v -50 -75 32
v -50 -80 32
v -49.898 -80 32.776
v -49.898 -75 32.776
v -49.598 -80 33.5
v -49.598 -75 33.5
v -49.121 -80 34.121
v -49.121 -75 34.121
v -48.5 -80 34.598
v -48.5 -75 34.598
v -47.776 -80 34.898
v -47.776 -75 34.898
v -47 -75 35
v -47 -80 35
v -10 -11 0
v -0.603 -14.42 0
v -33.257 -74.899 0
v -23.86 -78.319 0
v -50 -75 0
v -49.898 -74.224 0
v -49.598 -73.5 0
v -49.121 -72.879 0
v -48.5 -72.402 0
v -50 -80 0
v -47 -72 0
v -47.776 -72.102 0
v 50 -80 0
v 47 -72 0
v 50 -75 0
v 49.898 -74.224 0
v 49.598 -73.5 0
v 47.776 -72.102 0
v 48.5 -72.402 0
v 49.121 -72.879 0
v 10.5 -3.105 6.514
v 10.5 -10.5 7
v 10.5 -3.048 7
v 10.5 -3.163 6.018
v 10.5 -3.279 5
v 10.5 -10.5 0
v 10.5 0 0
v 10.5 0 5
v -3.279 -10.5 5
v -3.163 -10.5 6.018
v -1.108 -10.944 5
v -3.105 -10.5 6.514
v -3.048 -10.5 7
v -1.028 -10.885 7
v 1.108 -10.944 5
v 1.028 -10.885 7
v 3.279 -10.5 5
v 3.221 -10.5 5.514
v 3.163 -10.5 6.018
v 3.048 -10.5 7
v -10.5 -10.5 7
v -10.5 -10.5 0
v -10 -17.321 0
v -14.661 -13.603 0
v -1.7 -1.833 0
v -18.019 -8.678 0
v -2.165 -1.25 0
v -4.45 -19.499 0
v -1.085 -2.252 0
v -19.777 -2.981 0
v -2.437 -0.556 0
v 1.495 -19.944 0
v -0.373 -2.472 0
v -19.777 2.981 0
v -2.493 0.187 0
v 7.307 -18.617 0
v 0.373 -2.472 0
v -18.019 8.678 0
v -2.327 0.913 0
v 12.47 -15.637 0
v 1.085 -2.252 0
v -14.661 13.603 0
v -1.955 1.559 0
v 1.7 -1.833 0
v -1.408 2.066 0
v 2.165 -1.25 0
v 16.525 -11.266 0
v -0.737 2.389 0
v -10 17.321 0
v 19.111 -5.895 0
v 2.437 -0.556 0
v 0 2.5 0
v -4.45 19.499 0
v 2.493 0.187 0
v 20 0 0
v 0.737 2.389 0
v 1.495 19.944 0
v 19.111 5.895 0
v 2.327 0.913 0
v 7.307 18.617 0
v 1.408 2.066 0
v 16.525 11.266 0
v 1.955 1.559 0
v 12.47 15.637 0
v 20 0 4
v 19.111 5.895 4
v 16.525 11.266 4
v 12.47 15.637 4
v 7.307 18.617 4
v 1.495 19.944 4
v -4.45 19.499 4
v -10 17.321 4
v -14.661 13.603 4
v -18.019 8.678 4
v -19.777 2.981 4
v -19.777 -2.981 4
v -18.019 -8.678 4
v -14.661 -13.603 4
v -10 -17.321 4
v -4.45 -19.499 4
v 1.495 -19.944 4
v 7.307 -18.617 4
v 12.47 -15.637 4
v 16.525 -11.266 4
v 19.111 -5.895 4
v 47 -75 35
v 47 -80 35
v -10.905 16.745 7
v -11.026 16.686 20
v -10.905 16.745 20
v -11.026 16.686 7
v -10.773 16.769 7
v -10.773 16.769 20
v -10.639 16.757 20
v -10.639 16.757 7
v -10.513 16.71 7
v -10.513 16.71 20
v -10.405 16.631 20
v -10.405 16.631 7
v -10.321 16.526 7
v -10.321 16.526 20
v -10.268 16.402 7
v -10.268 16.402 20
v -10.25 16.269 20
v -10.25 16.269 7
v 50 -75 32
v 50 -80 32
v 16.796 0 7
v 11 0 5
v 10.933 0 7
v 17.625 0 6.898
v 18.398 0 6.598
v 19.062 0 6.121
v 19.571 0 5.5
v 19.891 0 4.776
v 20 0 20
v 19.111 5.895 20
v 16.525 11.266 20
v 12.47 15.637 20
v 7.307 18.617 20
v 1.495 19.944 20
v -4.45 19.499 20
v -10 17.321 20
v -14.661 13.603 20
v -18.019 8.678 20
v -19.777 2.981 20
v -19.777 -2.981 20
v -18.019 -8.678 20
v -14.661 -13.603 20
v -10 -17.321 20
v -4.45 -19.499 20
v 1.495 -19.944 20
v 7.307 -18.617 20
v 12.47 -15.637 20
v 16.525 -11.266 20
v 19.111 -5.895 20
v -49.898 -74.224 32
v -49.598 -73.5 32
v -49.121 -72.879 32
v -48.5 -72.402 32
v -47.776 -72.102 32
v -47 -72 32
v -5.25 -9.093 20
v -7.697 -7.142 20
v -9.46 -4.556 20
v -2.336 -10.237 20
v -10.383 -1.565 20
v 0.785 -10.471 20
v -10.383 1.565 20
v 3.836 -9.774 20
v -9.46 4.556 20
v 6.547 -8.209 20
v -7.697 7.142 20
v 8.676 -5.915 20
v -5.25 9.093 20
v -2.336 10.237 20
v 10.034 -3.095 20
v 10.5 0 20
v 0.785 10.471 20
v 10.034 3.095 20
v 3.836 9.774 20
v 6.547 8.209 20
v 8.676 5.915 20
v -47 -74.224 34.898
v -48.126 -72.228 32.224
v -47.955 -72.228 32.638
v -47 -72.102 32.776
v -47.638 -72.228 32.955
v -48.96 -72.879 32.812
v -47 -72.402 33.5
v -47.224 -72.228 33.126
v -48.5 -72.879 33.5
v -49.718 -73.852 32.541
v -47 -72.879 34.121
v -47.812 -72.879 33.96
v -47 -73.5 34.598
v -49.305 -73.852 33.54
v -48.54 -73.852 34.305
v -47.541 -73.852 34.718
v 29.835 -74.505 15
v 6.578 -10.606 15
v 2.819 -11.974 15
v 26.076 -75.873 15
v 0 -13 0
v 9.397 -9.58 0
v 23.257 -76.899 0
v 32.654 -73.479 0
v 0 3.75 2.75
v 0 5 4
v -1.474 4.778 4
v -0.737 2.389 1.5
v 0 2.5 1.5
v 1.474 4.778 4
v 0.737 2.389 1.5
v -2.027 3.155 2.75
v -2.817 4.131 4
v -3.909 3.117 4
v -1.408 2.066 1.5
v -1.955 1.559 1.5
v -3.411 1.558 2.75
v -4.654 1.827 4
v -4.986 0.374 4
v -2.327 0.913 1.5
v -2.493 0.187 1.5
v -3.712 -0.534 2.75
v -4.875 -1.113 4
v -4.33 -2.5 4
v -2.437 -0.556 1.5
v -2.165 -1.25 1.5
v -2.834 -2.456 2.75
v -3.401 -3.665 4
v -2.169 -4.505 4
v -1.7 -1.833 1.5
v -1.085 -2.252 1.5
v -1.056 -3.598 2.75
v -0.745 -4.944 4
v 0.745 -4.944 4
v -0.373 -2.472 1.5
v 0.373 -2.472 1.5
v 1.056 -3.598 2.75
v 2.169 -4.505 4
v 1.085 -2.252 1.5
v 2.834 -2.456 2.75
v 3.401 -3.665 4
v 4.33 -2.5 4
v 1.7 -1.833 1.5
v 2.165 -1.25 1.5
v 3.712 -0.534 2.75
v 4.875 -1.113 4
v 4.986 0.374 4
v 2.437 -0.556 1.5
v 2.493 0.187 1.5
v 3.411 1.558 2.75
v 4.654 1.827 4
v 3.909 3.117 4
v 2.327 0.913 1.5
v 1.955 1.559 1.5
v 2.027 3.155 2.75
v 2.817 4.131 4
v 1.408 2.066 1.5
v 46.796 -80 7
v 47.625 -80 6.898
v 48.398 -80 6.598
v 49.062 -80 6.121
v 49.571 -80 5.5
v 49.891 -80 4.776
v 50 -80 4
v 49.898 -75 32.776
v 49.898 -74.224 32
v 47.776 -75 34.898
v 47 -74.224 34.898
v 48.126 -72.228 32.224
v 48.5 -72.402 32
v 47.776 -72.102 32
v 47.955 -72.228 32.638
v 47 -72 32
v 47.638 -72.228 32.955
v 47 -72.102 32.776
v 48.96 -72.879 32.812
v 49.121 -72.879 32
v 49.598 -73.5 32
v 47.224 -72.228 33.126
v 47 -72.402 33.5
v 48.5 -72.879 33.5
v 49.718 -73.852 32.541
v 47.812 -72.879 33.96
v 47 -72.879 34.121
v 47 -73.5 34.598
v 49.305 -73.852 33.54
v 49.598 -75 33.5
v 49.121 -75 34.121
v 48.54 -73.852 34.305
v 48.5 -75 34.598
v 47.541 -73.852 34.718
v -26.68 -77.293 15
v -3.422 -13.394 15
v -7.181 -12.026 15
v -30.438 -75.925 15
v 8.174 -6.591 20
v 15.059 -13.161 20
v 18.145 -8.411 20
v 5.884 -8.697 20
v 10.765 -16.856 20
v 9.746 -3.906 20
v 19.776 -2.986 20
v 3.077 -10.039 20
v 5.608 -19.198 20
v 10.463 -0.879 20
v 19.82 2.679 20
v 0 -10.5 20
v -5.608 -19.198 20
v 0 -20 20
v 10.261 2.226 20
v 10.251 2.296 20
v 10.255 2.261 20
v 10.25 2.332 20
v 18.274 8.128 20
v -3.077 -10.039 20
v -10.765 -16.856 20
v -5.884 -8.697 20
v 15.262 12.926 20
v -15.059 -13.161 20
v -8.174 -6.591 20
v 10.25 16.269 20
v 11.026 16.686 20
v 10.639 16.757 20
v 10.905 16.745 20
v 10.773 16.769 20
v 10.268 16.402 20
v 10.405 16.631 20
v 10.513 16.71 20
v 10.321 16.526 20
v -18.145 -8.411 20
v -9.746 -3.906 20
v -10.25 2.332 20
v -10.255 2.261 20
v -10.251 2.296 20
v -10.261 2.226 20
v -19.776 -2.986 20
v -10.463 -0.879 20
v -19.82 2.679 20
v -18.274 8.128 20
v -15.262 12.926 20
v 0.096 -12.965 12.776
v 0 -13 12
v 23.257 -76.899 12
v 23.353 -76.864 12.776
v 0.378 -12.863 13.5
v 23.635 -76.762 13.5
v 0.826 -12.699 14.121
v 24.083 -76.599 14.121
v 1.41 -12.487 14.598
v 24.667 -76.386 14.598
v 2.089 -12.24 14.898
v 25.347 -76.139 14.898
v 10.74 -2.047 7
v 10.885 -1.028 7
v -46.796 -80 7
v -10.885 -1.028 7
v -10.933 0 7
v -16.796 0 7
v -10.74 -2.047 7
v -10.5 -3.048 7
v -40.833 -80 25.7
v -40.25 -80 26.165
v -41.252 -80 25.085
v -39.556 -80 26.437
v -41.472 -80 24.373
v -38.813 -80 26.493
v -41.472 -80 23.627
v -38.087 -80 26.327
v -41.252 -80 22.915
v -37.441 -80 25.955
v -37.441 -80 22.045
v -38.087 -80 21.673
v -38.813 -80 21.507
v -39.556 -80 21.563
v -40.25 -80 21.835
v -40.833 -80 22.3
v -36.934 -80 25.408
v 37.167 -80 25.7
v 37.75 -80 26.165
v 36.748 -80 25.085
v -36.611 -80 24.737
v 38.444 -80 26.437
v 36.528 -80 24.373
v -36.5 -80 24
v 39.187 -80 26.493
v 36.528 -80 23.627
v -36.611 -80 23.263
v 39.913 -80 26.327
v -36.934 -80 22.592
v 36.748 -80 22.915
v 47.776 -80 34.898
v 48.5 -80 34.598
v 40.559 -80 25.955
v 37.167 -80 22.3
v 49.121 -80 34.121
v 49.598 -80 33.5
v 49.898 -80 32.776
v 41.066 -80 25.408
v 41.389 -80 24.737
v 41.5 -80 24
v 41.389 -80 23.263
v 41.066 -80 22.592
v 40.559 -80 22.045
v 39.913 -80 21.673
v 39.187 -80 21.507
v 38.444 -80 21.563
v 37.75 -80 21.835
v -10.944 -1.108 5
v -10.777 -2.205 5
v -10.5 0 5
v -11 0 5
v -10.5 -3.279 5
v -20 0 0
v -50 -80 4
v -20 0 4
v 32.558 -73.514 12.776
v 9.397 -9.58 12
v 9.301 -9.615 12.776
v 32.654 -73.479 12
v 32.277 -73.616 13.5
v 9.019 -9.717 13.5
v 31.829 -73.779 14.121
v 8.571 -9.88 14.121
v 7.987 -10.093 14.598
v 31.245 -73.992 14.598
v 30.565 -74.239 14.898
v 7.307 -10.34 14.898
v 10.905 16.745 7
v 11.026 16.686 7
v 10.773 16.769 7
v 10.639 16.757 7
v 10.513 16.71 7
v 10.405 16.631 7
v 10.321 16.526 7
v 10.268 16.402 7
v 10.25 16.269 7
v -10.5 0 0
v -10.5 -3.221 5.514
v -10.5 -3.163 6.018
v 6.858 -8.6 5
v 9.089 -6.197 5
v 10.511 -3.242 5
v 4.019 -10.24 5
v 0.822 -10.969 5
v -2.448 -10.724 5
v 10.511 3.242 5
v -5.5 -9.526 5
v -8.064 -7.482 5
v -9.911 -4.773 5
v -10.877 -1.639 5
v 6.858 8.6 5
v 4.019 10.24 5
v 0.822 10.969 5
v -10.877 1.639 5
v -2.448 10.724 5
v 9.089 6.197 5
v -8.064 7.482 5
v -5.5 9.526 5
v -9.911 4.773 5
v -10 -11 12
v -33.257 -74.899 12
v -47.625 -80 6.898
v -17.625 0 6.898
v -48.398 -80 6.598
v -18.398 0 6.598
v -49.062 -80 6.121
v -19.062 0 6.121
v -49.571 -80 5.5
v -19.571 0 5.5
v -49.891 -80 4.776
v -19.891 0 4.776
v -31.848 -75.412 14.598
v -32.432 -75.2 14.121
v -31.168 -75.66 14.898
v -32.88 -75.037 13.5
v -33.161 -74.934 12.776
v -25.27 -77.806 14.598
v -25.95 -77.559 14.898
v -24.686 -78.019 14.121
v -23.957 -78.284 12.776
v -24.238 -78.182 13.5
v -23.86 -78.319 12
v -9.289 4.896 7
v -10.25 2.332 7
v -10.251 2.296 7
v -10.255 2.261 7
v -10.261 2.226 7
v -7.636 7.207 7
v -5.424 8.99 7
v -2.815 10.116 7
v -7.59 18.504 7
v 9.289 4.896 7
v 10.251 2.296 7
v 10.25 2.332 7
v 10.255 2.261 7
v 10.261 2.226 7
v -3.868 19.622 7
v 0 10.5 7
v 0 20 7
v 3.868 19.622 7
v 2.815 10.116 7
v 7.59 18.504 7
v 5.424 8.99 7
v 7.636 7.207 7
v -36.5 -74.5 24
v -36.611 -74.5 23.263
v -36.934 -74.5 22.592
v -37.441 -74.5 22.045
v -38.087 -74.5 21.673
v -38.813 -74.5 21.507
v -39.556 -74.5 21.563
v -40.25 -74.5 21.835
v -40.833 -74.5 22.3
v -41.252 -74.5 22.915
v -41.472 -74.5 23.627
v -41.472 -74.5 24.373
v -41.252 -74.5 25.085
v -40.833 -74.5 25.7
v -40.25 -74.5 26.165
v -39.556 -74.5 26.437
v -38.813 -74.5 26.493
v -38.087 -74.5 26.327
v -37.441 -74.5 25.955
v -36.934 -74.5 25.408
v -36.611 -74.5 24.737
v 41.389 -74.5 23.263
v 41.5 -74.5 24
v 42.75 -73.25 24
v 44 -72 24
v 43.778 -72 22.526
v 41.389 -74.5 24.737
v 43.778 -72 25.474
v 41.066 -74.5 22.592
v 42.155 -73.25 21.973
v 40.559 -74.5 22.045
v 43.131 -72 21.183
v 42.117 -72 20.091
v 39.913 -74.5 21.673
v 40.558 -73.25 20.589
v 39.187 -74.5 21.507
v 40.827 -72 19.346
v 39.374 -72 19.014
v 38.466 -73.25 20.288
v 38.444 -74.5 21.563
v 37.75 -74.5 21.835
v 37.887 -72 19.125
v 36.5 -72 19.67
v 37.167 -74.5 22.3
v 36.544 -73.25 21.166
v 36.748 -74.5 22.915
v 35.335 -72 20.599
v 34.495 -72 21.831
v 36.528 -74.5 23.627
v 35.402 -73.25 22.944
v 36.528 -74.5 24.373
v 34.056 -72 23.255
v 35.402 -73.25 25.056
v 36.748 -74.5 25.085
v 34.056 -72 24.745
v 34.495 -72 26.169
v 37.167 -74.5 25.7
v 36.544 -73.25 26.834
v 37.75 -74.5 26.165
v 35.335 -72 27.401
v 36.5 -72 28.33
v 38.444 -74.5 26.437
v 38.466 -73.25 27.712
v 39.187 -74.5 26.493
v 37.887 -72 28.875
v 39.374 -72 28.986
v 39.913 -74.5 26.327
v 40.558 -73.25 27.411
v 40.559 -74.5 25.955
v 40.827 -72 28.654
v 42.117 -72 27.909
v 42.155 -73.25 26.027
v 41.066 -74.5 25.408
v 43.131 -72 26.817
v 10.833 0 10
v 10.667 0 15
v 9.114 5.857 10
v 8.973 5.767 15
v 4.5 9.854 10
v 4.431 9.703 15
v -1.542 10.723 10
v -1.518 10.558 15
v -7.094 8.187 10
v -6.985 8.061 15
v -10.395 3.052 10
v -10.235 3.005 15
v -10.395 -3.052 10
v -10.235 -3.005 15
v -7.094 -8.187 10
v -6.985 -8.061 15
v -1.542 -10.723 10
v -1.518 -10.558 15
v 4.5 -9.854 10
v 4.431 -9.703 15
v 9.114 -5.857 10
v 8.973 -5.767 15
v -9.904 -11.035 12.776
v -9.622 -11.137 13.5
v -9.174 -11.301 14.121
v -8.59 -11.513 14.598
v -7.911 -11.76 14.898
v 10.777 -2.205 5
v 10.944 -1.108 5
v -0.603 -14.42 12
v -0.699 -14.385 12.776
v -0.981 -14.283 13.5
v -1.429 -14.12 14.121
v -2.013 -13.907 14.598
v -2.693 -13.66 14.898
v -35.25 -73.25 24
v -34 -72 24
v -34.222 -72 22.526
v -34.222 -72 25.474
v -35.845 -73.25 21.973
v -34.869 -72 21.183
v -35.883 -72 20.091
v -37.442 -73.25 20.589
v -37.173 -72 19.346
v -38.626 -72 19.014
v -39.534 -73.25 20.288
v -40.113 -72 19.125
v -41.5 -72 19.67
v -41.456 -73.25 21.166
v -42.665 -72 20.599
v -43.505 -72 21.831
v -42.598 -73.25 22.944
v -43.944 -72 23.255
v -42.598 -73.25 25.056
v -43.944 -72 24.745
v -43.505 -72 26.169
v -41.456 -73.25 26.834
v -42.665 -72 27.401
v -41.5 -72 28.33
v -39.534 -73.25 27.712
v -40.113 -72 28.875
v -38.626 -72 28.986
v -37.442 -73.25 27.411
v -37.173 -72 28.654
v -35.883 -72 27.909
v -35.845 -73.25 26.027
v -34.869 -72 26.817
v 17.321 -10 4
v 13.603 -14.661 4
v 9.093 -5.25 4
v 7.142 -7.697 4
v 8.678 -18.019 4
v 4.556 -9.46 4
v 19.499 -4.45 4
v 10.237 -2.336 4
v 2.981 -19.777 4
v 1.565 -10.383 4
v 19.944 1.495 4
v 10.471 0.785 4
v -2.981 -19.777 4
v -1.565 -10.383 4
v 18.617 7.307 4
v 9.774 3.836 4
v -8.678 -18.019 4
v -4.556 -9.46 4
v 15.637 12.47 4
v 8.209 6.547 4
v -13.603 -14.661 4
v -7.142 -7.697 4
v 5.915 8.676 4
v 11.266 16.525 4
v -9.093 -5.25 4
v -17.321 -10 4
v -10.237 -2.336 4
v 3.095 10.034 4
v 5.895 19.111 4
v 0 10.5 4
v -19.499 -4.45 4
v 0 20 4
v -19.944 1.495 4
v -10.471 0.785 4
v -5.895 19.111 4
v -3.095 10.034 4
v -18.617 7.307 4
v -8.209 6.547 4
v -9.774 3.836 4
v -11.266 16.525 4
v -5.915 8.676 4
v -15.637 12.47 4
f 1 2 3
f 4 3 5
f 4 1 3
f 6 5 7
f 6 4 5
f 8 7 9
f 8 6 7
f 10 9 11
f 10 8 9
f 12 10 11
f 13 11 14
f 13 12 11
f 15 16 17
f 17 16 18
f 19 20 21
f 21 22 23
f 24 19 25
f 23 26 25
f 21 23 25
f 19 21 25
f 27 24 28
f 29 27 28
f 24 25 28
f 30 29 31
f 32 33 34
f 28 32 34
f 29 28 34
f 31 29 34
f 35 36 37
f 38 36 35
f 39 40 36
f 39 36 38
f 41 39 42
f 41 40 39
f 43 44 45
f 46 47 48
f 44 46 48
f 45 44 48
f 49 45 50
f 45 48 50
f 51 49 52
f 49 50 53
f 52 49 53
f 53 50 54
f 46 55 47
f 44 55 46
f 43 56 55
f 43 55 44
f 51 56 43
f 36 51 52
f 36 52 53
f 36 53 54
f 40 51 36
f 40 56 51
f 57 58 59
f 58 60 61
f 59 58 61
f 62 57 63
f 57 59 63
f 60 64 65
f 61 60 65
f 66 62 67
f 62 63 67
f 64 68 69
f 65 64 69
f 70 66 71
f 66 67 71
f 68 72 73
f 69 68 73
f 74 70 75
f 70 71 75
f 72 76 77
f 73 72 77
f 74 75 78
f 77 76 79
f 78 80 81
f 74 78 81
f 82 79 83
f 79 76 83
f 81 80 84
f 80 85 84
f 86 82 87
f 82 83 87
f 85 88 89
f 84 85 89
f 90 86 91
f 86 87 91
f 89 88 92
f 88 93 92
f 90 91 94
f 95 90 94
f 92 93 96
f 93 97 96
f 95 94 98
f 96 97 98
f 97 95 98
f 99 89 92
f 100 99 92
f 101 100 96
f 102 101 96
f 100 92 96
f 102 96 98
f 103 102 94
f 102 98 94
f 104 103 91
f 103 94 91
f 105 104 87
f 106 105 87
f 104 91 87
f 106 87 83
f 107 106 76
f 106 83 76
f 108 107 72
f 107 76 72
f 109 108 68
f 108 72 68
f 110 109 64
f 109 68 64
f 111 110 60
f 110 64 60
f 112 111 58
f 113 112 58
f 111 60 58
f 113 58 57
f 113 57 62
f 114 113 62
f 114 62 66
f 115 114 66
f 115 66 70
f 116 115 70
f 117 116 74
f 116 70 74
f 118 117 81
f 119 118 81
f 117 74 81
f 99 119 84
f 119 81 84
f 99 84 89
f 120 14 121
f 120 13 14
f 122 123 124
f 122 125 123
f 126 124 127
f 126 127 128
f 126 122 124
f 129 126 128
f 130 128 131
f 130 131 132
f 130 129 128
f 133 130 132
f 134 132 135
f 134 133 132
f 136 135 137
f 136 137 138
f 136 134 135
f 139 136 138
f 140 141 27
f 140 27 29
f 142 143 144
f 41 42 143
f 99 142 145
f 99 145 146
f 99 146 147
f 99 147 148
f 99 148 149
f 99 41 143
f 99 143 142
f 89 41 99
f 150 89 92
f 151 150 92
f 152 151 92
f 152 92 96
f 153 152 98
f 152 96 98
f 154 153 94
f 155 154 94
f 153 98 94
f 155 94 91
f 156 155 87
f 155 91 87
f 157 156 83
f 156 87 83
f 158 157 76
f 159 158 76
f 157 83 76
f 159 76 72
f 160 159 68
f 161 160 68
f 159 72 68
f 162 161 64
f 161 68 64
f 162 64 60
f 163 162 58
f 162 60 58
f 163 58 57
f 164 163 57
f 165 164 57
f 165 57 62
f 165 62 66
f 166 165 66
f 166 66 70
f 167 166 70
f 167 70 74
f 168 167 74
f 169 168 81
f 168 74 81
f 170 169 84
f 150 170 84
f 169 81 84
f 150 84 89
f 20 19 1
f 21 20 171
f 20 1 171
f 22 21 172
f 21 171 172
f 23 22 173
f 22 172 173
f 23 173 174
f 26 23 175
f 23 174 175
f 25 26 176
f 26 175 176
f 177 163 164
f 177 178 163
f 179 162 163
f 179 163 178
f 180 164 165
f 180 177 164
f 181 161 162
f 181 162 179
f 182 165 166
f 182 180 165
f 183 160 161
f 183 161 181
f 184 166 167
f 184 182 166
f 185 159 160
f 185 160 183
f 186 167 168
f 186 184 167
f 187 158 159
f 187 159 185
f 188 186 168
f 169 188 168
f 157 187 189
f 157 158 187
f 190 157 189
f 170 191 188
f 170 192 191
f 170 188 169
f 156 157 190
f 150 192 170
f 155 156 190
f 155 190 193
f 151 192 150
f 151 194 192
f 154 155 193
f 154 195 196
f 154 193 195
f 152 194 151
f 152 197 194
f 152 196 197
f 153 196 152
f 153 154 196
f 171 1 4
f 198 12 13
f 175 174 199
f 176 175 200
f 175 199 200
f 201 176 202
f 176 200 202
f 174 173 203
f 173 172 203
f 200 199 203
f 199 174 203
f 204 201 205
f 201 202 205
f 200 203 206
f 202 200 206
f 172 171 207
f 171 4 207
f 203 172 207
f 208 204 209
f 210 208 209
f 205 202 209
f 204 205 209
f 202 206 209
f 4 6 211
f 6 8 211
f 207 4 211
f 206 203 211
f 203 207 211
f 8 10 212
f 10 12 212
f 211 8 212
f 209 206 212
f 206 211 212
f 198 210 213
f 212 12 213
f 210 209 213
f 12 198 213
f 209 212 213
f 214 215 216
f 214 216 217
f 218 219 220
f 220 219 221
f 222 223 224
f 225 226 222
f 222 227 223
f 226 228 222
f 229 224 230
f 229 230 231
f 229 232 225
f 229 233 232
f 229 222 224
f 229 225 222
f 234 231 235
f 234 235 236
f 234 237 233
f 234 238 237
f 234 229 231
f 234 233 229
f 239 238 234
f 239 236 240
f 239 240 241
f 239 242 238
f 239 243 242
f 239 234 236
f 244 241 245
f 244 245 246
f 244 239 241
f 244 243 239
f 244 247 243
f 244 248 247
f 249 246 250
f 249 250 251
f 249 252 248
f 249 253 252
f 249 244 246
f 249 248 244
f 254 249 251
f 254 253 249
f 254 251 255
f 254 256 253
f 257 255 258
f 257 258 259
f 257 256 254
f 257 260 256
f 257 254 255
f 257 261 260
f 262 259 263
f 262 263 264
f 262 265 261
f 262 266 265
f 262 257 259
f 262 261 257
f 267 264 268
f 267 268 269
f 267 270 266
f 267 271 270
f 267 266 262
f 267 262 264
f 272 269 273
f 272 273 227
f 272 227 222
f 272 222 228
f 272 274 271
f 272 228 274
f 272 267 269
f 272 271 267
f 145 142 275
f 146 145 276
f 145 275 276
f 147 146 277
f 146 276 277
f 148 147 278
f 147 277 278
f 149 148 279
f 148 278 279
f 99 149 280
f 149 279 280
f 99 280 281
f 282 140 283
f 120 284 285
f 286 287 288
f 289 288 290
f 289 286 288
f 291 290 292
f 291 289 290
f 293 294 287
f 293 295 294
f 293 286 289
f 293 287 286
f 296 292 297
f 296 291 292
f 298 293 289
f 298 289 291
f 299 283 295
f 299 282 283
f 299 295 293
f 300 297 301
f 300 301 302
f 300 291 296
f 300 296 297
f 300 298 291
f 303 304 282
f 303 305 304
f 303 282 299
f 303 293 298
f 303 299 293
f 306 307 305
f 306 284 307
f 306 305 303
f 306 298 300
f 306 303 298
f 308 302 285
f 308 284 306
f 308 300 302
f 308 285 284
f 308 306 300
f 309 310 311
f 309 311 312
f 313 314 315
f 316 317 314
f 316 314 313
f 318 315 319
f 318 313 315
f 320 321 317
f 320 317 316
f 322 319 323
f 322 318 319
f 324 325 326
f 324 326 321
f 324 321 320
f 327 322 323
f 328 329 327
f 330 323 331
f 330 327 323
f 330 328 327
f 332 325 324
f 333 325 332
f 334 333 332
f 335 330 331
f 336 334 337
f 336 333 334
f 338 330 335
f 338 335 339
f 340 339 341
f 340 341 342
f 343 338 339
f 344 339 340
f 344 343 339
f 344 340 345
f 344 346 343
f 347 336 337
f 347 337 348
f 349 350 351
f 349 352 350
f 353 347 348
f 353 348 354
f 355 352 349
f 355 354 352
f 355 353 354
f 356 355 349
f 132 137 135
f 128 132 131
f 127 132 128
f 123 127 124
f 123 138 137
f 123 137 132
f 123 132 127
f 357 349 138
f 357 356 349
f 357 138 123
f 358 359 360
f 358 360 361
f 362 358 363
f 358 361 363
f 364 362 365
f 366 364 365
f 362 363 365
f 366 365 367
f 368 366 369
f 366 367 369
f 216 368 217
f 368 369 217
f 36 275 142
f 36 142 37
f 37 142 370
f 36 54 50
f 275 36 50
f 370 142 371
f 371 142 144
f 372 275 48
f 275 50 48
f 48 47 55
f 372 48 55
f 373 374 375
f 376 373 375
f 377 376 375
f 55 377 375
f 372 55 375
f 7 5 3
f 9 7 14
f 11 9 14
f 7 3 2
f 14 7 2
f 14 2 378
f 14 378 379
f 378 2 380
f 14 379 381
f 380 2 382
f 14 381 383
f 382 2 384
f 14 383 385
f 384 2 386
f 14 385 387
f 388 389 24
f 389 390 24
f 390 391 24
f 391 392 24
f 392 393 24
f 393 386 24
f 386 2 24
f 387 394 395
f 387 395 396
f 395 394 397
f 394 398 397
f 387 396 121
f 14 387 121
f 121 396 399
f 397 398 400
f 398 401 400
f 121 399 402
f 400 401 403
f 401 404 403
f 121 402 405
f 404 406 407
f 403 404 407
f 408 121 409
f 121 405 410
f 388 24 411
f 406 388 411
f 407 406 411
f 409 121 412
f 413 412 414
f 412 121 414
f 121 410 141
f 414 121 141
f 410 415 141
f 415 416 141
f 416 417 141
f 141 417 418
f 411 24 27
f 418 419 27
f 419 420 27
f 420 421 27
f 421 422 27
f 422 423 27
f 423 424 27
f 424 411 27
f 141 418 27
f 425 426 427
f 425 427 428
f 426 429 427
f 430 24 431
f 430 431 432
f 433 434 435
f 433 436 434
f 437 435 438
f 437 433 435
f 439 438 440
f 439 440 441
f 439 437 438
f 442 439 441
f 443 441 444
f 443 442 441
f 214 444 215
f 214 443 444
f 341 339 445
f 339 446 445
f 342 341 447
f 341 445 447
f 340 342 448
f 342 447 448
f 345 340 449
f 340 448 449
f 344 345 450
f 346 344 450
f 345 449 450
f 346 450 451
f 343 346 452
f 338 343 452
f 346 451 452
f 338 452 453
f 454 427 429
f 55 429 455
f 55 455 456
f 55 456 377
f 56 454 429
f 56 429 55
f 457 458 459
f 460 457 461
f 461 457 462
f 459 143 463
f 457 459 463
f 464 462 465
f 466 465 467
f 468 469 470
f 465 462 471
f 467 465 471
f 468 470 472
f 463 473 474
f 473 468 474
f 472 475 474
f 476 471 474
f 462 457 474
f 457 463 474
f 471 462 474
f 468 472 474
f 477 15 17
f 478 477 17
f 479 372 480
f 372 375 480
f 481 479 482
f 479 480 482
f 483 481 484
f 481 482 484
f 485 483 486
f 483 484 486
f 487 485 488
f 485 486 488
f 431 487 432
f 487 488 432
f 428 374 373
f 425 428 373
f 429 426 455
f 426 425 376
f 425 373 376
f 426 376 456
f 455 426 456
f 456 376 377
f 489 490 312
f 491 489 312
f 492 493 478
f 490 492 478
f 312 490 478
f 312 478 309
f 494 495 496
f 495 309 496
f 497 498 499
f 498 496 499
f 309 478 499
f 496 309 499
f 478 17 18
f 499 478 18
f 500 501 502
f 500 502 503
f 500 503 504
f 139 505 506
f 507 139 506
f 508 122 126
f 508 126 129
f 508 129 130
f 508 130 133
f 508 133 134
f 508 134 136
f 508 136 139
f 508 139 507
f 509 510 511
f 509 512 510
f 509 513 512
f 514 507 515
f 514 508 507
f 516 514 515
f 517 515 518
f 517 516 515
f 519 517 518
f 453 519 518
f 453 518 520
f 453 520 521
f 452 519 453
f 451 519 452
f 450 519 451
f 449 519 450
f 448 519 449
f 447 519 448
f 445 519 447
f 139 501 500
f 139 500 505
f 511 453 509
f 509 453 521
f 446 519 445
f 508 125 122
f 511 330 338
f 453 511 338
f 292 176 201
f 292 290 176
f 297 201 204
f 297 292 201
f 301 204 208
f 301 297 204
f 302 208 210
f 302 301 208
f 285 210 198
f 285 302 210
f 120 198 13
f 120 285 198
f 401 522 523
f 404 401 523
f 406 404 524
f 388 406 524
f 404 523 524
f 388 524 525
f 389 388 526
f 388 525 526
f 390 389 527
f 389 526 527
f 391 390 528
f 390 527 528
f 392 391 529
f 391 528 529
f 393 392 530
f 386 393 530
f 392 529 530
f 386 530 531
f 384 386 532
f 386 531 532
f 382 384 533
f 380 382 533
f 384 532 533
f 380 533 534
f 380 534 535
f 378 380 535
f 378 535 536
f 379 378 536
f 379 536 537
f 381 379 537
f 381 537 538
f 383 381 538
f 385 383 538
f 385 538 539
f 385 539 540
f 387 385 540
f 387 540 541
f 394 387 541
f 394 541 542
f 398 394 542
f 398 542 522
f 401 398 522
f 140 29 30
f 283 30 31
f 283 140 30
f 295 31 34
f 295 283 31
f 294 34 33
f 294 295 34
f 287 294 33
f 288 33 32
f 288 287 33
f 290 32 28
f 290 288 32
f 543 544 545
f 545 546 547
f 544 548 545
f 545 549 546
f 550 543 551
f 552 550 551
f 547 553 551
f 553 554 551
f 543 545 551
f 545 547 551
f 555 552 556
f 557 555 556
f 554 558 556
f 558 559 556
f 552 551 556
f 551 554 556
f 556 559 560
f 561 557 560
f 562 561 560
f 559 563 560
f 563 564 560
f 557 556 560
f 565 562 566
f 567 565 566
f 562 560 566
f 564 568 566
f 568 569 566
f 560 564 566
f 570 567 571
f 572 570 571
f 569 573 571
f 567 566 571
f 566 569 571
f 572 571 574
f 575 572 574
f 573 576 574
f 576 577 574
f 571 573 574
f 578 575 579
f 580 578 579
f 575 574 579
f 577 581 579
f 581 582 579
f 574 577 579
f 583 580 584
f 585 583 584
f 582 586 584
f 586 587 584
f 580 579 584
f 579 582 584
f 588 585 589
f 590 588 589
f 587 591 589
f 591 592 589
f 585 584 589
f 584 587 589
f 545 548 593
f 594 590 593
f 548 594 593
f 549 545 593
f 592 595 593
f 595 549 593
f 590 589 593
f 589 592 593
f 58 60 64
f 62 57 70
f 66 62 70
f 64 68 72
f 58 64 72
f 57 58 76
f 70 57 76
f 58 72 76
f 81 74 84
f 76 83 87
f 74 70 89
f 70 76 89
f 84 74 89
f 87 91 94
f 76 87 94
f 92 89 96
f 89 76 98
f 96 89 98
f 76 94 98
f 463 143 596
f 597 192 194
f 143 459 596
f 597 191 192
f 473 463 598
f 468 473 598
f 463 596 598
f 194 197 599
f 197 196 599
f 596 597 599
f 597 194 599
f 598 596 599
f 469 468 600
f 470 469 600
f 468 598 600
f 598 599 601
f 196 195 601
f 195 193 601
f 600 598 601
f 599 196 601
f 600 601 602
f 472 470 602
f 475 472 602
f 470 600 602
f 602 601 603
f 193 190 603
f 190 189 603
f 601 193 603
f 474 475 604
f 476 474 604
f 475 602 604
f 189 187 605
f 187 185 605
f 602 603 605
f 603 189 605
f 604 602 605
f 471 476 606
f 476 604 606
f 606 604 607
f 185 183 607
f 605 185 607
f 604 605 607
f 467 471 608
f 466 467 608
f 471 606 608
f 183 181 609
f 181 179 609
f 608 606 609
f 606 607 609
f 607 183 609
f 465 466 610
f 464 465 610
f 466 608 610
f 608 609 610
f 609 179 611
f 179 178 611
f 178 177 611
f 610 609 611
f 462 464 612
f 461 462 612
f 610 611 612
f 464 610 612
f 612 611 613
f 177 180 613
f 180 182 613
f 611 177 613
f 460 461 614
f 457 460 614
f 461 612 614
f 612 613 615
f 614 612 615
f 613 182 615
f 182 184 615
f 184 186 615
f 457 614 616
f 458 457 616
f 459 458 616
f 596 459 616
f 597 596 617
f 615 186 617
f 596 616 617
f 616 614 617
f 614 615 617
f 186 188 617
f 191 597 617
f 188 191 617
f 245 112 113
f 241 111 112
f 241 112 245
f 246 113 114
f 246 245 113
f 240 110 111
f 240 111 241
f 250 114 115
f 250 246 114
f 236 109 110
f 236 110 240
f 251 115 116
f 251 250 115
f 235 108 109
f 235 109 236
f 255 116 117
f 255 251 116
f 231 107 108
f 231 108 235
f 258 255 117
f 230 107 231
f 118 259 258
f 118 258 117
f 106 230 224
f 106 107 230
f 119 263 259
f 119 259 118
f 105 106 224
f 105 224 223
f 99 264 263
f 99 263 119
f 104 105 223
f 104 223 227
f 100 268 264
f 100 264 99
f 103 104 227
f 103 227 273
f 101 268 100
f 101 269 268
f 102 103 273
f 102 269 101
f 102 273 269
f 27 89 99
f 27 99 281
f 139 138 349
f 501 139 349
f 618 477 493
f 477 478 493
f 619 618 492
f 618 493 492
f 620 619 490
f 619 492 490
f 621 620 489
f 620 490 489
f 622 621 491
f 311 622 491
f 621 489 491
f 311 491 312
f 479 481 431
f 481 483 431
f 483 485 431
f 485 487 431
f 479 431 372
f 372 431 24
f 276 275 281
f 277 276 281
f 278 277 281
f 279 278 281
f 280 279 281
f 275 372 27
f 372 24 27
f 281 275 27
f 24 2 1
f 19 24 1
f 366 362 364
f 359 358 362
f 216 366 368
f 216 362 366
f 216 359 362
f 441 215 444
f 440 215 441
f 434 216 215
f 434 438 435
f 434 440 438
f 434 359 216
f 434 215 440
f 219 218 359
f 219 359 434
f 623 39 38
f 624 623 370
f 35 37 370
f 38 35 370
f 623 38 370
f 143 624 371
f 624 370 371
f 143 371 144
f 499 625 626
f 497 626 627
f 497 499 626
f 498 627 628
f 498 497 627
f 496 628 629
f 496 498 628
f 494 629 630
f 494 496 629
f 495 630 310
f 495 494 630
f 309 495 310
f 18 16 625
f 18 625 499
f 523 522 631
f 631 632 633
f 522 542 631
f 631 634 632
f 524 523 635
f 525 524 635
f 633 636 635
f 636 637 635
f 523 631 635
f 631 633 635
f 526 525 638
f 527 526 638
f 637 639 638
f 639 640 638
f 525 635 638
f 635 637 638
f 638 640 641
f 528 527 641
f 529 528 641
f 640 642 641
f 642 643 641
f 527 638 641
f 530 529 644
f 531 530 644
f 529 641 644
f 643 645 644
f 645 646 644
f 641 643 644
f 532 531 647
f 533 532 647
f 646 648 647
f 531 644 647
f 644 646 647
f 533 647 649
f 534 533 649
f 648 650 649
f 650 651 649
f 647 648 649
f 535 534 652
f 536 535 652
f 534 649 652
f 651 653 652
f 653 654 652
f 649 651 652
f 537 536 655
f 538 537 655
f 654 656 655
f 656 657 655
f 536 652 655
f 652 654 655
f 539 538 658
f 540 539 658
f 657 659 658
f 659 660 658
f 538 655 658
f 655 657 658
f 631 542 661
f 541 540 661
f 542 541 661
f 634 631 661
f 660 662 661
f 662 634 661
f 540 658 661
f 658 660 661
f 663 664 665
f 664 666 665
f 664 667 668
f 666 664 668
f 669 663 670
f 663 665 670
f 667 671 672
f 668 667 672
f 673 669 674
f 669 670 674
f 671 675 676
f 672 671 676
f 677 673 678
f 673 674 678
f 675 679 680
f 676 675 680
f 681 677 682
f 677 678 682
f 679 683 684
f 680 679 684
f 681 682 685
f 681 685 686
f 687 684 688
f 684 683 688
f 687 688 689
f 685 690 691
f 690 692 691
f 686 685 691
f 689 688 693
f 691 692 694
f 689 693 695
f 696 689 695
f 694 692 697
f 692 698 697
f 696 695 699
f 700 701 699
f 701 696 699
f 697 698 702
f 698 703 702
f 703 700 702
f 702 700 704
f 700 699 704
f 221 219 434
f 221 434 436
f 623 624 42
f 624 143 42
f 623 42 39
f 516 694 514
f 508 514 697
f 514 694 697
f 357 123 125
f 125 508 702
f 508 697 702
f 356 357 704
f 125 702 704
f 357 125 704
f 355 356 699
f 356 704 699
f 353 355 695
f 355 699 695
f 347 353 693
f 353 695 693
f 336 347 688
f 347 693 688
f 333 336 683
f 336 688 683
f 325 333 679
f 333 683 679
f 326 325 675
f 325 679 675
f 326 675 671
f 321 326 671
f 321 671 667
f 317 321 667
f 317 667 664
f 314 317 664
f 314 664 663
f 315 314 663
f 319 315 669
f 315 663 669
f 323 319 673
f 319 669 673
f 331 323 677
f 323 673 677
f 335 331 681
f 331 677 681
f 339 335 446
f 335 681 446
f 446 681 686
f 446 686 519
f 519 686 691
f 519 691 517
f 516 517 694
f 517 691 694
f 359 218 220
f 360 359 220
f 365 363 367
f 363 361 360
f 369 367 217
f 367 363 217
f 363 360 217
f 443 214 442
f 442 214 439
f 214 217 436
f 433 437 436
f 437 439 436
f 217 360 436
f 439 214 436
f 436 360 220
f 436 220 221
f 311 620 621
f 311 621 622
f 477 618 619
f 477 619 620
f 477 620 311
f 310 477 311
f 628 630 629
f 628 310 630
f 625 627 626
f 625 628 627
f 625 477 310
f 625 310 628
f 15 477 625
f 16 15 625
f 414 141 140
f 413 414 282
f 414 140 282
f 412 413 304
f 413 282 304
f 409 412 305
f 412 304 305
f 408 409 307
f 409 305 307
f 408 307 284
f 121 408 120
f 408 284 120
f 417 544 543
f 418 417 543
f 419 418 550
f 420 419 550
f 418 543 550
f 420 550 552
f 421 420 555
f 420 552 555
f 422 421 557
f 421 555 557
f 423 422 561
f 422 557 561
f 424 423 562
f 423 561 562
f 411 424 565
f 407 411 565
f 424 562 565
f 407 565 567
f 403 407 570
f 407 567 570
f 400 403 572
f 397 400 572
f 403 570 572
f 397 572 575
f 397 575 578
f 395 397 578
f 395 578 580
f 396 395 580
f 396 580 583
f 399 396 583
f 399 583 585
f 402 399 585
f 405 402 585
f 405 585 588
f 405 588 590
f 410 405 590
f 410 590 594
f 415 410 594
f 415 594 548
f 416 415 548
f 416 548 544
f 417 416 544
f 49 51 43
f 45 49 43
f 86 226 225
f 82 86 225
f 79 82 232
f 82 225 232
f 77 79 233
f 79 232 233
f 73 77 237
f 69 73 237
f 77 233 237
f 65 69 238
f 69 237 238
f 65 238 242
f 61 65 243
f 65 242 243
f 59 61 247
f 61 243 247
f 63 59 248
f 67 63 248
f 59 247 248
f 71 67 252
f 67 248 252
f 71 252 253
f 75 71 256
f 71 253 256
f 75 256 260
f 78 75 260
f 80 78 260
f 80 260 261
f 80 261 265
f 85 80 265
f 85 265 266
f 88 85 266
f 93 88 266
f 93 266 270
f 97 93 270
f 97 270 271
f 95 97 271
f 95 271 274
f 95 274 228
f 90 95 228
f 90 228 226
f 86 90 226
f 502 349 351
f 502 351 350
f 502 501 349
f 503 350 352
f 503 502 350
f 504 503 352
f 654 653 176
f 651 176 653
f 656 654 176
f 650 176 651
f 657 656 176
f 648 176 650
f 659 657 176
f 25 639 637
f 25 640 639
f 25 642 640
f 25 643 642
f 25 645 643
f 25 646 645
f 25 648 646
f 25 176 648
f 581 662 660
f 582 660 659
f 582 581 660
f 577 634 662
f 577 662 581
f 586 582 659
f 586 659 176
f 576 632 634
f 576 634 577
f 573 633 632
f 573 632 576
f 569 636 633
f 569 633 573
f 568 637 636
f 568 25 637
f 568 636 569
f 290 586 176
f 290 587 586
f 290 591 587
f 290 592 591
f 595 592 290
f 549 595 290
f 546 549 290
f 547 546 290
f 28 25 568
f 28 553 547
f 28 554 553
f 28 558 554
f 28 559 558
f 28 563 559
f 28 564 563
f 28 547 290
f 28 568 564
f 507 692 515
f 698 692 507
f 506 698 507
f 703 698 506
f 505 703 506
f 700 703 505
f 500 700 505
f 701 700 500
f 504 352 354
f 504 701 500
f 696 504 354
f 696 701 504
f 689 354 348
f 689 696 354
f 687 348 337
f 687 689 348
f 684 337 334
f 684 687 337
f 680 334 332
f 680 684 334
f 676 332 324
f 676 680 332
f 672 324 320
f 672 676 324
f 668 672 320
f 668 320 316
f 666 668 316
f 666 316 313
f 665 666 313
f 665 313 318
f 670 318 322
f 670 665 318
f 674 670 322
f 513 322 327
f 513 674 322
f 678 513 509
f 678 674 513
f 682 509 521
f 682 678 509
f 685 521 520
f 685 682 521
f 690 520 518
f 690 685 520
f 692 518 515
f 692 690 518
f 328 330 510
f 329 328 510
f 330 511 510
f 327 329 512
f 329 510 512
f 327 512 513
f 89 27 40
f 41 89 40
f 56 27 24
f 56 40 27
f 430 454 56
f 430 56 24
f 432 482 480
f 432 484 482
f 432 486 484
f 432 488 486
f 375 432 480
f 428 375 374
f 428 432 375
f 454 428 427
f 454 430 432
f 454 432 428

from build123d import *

# Parameters (mm, degrees)
FACE003_R              = 2.5
EXTRUDE003_DEPTH       = 10
SKETCH_R               = 20
EXTRUDE_DEPTH          = 4
CHAMFER_SIZE           = 2.5
EXTRUDE002_DEPTH       = 13
FACE001_R              = 20
FACE001_R_2            = 10.5
EXTRUDE001_DEPTH       = 16
FILLET_R               = 0.5
CYLINDER_R             = 20
CYLINDER_DEPTH         = 20
EXTRUDE004_DEPTH       = 7
FILLET001_R            = 3
BOX001_W               = 68
BOX001_H               = 10
BOX001_DEPTH           = 15
BOX001_PLACEMENT_ANGLE = 110
FILLET003_R            = 3
BOX002_W               = 68
BOX002_H               = 10
BOX002_DEPTH           = 15
BOX002_PLACEMENT_ANGLE = 70
FILLET004_R            = 3
FACE005_R              = 2.5
EXTRUDE005_DEPTH       = 10
BOX_W                  = 100
BOX_H                  = 8
BOX_DEPTH              = 35
FILLET002_R            = 3
CHAMFER001_SIZE        = 2.5


with BuildPart() as extrude003:
    # Face003 → Extrude003 (new body)
    with BuildSketch(Plane(origin=(0, 0, 4), x_dir=(0, 1, 0), z_dir=(0, 0, 1))):
        Circle(FACE003_R)
    extrude(amount=-EXTRUDE003_DEPTH)


with BuildPart() as chamfer_body:
    # Sketch → Extrude (new body)
    with BuildSketch(Plane.XY):
        Circle(SKETCH_R)
    extrude(amount=EXTRUDE_DEPTH)

    # Cut001: cut Extrude003
    add(extrude003.part, mode=Mode.SUBTRACT)

    # Chamfer
    chamfer_edges = [chamfer_body.edges().sort_by_distance(p)[0] for p in [
        (-2.5, 0, 4),
    ]]
    chamfer(chamfer_edges, length=CHAMFER_SIZE)


with BuildPart() as extrude002:
    # Sketch002 (on Face4 of Extrude001) → Extrude002 (new body)
    with BuildSketch(Plane.XY.offset(20)):
        Polygon((0, 0), (10.25, 0), (10.25, 25), (-10.25, 25), (-10.25, 0), align=None)
    extrude(amount=-EXTRUDE002_DEPTH)


with BuildPart() as fillet_body:
    # Face001 → Extrude001 (new body)
    with BuildSketch(Plane(origin=(0, 0, 4), x_dir=(0, 1, 0), z_dir=(0, 0, 1))):
        Circle(FACE001_R)
        Circle(FACE001_R_2, mode=Mode.SUBTRACT)
    extrude(amount=EXTRUDE001_DEPTH)

    # Cut: cut Extrude002
    add(extrude002.part, mode=Mode.SUBTRACT)

    # Fillet
    fillet_edges = [fillet_body.edges().sort_by_distance(p)[0] for p in [
        (-10.25, 17.173744, 13.5),
        (10.25, 17.173744, 13.5),
        (-10.25, 2.277608, 13.5),
        (10.25, 2.277608, 13.5),
    ]]
    fillet(fillet_edges, radius=FILLET_R)


with BuildPart() as cone:
    # Cone → Cone (revolve)
    with BuildSketch(Plane(origin=(0, 0, 5), x_dir=(1, 0, 0), z_dir=(0, -1, 0))):
        Polygon((0, 0), (11, 0), (10.5, 15), (0, 15), align=None)
    revolve(axis=Axis((0, 0, 5), (0, 0, 1)))


with BuildPart() as cut002:
    # Cylinder → Cylinder (new body)
    with BuildSketch(Plane.XY):
        Circle(CYLINDER_R)
    extrude(amount=CYLINDER_DEPTH)

    # Cut002: cut Cone
    add(cone.part, mode=Mode.SUBTRACT)


with BuildPart() as cone001:
    # Cone001 → Cone001 (revolve)
    with BuildSketch(Plane(origin=(0, 0, 5), x_dir=(1, 0, 0), z_dir=(0, -1, 0))):
        Polygon((0, 0), (11, 0), (10.5, 15), (0, 15), align=None)
    revolve(axis=Axis((0, 0, 5), (0, 0, 1)))


with BuildPart() as fillet001:
    # Sketch005 → Extrude004 (new body)
    with BuildSketch(Plane.XY):
        Polygon((-20, 0), (-10.5, 0), (-10.5, -10.5), (10.5, -10.5), (10.5, 0), (20, 0), (50, -80), (0, -80), (-50, -80), align=None)
    extrude(amount=EXTRUDE004_DEPTH)

    # Cut003: cut Cone001
    add(cone001.part, mode=Mode.SUBTRACT)

    # Fillet001
    fillet001_edges = [fillet001.edges().sort_by_distance(p)[0] for p in [
        (35, -40, 7),
        (-35, -40, 7),
    ]]
    fillet(fillet001_edges, radius=FILLET001_R)


with BuildPart() as fillet003:
    # Box001 → Box001 (new body)
    with BuildSketch(Plane.XY):
        with Locations((34, 5)):
            Rectangle(BOX001_W, BOX001_H)
    extrude(amount=BOX001_DEPTH)


with BuildPart() as fillet003_1:
    # Box001 placement: moved
    add(fillet003.part.moved(Location((-10, -11, 0))).rotate(Axis((-10, -11, 0), (0, 0, -1)), BOX001_PLACEMENT_ANGLE))

    # Fillet003
    fillet003_edges = [fillet003_1.edges().sort_by_distance(p)[0] for p in [
        (-21.628685, -42.949549, 15),
        (-12.231759, -46.369751, 15),
    ]]
    fillet(fillet003_edges, radius=FILLET003_R)


with BuildPart() as fillet004:
    # Box002 → Box002 (new body)
    with BuildSketch(Plane.XY):
        with Locations((34, 5)):
            Rectangle(BOX002_W, BOX002_H)
    extrude(amount=BOX002_DEPTH)


with BuildPart() as fillet004_1:
    # Box002 placement: moved
    add(fillet004.part.moved(Location((0, -13, 0))).rotate(Axis((0, -13, 0), (0, 0, -1)), BOX002_PLACEMENT_ANGLE))

    # Fillet004
    fillet004_edges = [fillet004_1.edges().sort_by_distance(p)[0] for p in [
        (11.628685, -44.949549, 15),
        (21.025611, -41.529348, 15),
    ]]
    fillet(fillet004_edges, radius=FILLET004_R)


with BuildPart() as extrude005:
    # Face005 → Extrude005 (new body)
    with BuildSketch(Plane(origin=(-39, -72, 24), x_dir=(1, 0, 0), z_dir=(0, 1, 0))):
        Circle(FACE005_R)
        with Locations((78, 0)):
            Circle(FACE005_R)
    extrude(amount=-EXTRUDE005_DEPTH)


with BuildPart() as chamfer001:
    # Box → Box (new body)
    with BuildSketch(Plane(origin=(-50, -80, 0), x_dir=(1, 0, 0), z_dir=(0, 0, 1))):
        with Locations((50, 4)):
            Rectangle(BOX_W, BOX_H)
    extrude(amount=BOX_DEPTH)

    # Fillet002
    fillet002_edges = [chamfer001.edges().sort_by_distance(p)[0] for p in [
        (-50, -76, 35),
        (-50, -72, 17.5),
        (50, -76, 35),
        (50, -72, 17.5),
        (0, -72, 35),
    ]]
    fillet(fillet002_edges, radius=FILLET002_R)

    # Cut004: cut Extrude005
    add(extrude005.part, mode=Mode.SUBTRACT)

    # Chamfer001
    chamfer001_edges = [chamfer001.edges().sort_by_distance(p)[0] for p in [
        (-36.5, -72, 24),
        (41.5, -72, 24),
    ]]
    chamfer(chamfer001_edges, length=CHAMFER001_SIZE)


solid = Compound([chamfer_body.part, fillet_body.part, cut002.part, fillet001.part, fillet003_1.part, fillet004_1.part, chamfer001.part])
